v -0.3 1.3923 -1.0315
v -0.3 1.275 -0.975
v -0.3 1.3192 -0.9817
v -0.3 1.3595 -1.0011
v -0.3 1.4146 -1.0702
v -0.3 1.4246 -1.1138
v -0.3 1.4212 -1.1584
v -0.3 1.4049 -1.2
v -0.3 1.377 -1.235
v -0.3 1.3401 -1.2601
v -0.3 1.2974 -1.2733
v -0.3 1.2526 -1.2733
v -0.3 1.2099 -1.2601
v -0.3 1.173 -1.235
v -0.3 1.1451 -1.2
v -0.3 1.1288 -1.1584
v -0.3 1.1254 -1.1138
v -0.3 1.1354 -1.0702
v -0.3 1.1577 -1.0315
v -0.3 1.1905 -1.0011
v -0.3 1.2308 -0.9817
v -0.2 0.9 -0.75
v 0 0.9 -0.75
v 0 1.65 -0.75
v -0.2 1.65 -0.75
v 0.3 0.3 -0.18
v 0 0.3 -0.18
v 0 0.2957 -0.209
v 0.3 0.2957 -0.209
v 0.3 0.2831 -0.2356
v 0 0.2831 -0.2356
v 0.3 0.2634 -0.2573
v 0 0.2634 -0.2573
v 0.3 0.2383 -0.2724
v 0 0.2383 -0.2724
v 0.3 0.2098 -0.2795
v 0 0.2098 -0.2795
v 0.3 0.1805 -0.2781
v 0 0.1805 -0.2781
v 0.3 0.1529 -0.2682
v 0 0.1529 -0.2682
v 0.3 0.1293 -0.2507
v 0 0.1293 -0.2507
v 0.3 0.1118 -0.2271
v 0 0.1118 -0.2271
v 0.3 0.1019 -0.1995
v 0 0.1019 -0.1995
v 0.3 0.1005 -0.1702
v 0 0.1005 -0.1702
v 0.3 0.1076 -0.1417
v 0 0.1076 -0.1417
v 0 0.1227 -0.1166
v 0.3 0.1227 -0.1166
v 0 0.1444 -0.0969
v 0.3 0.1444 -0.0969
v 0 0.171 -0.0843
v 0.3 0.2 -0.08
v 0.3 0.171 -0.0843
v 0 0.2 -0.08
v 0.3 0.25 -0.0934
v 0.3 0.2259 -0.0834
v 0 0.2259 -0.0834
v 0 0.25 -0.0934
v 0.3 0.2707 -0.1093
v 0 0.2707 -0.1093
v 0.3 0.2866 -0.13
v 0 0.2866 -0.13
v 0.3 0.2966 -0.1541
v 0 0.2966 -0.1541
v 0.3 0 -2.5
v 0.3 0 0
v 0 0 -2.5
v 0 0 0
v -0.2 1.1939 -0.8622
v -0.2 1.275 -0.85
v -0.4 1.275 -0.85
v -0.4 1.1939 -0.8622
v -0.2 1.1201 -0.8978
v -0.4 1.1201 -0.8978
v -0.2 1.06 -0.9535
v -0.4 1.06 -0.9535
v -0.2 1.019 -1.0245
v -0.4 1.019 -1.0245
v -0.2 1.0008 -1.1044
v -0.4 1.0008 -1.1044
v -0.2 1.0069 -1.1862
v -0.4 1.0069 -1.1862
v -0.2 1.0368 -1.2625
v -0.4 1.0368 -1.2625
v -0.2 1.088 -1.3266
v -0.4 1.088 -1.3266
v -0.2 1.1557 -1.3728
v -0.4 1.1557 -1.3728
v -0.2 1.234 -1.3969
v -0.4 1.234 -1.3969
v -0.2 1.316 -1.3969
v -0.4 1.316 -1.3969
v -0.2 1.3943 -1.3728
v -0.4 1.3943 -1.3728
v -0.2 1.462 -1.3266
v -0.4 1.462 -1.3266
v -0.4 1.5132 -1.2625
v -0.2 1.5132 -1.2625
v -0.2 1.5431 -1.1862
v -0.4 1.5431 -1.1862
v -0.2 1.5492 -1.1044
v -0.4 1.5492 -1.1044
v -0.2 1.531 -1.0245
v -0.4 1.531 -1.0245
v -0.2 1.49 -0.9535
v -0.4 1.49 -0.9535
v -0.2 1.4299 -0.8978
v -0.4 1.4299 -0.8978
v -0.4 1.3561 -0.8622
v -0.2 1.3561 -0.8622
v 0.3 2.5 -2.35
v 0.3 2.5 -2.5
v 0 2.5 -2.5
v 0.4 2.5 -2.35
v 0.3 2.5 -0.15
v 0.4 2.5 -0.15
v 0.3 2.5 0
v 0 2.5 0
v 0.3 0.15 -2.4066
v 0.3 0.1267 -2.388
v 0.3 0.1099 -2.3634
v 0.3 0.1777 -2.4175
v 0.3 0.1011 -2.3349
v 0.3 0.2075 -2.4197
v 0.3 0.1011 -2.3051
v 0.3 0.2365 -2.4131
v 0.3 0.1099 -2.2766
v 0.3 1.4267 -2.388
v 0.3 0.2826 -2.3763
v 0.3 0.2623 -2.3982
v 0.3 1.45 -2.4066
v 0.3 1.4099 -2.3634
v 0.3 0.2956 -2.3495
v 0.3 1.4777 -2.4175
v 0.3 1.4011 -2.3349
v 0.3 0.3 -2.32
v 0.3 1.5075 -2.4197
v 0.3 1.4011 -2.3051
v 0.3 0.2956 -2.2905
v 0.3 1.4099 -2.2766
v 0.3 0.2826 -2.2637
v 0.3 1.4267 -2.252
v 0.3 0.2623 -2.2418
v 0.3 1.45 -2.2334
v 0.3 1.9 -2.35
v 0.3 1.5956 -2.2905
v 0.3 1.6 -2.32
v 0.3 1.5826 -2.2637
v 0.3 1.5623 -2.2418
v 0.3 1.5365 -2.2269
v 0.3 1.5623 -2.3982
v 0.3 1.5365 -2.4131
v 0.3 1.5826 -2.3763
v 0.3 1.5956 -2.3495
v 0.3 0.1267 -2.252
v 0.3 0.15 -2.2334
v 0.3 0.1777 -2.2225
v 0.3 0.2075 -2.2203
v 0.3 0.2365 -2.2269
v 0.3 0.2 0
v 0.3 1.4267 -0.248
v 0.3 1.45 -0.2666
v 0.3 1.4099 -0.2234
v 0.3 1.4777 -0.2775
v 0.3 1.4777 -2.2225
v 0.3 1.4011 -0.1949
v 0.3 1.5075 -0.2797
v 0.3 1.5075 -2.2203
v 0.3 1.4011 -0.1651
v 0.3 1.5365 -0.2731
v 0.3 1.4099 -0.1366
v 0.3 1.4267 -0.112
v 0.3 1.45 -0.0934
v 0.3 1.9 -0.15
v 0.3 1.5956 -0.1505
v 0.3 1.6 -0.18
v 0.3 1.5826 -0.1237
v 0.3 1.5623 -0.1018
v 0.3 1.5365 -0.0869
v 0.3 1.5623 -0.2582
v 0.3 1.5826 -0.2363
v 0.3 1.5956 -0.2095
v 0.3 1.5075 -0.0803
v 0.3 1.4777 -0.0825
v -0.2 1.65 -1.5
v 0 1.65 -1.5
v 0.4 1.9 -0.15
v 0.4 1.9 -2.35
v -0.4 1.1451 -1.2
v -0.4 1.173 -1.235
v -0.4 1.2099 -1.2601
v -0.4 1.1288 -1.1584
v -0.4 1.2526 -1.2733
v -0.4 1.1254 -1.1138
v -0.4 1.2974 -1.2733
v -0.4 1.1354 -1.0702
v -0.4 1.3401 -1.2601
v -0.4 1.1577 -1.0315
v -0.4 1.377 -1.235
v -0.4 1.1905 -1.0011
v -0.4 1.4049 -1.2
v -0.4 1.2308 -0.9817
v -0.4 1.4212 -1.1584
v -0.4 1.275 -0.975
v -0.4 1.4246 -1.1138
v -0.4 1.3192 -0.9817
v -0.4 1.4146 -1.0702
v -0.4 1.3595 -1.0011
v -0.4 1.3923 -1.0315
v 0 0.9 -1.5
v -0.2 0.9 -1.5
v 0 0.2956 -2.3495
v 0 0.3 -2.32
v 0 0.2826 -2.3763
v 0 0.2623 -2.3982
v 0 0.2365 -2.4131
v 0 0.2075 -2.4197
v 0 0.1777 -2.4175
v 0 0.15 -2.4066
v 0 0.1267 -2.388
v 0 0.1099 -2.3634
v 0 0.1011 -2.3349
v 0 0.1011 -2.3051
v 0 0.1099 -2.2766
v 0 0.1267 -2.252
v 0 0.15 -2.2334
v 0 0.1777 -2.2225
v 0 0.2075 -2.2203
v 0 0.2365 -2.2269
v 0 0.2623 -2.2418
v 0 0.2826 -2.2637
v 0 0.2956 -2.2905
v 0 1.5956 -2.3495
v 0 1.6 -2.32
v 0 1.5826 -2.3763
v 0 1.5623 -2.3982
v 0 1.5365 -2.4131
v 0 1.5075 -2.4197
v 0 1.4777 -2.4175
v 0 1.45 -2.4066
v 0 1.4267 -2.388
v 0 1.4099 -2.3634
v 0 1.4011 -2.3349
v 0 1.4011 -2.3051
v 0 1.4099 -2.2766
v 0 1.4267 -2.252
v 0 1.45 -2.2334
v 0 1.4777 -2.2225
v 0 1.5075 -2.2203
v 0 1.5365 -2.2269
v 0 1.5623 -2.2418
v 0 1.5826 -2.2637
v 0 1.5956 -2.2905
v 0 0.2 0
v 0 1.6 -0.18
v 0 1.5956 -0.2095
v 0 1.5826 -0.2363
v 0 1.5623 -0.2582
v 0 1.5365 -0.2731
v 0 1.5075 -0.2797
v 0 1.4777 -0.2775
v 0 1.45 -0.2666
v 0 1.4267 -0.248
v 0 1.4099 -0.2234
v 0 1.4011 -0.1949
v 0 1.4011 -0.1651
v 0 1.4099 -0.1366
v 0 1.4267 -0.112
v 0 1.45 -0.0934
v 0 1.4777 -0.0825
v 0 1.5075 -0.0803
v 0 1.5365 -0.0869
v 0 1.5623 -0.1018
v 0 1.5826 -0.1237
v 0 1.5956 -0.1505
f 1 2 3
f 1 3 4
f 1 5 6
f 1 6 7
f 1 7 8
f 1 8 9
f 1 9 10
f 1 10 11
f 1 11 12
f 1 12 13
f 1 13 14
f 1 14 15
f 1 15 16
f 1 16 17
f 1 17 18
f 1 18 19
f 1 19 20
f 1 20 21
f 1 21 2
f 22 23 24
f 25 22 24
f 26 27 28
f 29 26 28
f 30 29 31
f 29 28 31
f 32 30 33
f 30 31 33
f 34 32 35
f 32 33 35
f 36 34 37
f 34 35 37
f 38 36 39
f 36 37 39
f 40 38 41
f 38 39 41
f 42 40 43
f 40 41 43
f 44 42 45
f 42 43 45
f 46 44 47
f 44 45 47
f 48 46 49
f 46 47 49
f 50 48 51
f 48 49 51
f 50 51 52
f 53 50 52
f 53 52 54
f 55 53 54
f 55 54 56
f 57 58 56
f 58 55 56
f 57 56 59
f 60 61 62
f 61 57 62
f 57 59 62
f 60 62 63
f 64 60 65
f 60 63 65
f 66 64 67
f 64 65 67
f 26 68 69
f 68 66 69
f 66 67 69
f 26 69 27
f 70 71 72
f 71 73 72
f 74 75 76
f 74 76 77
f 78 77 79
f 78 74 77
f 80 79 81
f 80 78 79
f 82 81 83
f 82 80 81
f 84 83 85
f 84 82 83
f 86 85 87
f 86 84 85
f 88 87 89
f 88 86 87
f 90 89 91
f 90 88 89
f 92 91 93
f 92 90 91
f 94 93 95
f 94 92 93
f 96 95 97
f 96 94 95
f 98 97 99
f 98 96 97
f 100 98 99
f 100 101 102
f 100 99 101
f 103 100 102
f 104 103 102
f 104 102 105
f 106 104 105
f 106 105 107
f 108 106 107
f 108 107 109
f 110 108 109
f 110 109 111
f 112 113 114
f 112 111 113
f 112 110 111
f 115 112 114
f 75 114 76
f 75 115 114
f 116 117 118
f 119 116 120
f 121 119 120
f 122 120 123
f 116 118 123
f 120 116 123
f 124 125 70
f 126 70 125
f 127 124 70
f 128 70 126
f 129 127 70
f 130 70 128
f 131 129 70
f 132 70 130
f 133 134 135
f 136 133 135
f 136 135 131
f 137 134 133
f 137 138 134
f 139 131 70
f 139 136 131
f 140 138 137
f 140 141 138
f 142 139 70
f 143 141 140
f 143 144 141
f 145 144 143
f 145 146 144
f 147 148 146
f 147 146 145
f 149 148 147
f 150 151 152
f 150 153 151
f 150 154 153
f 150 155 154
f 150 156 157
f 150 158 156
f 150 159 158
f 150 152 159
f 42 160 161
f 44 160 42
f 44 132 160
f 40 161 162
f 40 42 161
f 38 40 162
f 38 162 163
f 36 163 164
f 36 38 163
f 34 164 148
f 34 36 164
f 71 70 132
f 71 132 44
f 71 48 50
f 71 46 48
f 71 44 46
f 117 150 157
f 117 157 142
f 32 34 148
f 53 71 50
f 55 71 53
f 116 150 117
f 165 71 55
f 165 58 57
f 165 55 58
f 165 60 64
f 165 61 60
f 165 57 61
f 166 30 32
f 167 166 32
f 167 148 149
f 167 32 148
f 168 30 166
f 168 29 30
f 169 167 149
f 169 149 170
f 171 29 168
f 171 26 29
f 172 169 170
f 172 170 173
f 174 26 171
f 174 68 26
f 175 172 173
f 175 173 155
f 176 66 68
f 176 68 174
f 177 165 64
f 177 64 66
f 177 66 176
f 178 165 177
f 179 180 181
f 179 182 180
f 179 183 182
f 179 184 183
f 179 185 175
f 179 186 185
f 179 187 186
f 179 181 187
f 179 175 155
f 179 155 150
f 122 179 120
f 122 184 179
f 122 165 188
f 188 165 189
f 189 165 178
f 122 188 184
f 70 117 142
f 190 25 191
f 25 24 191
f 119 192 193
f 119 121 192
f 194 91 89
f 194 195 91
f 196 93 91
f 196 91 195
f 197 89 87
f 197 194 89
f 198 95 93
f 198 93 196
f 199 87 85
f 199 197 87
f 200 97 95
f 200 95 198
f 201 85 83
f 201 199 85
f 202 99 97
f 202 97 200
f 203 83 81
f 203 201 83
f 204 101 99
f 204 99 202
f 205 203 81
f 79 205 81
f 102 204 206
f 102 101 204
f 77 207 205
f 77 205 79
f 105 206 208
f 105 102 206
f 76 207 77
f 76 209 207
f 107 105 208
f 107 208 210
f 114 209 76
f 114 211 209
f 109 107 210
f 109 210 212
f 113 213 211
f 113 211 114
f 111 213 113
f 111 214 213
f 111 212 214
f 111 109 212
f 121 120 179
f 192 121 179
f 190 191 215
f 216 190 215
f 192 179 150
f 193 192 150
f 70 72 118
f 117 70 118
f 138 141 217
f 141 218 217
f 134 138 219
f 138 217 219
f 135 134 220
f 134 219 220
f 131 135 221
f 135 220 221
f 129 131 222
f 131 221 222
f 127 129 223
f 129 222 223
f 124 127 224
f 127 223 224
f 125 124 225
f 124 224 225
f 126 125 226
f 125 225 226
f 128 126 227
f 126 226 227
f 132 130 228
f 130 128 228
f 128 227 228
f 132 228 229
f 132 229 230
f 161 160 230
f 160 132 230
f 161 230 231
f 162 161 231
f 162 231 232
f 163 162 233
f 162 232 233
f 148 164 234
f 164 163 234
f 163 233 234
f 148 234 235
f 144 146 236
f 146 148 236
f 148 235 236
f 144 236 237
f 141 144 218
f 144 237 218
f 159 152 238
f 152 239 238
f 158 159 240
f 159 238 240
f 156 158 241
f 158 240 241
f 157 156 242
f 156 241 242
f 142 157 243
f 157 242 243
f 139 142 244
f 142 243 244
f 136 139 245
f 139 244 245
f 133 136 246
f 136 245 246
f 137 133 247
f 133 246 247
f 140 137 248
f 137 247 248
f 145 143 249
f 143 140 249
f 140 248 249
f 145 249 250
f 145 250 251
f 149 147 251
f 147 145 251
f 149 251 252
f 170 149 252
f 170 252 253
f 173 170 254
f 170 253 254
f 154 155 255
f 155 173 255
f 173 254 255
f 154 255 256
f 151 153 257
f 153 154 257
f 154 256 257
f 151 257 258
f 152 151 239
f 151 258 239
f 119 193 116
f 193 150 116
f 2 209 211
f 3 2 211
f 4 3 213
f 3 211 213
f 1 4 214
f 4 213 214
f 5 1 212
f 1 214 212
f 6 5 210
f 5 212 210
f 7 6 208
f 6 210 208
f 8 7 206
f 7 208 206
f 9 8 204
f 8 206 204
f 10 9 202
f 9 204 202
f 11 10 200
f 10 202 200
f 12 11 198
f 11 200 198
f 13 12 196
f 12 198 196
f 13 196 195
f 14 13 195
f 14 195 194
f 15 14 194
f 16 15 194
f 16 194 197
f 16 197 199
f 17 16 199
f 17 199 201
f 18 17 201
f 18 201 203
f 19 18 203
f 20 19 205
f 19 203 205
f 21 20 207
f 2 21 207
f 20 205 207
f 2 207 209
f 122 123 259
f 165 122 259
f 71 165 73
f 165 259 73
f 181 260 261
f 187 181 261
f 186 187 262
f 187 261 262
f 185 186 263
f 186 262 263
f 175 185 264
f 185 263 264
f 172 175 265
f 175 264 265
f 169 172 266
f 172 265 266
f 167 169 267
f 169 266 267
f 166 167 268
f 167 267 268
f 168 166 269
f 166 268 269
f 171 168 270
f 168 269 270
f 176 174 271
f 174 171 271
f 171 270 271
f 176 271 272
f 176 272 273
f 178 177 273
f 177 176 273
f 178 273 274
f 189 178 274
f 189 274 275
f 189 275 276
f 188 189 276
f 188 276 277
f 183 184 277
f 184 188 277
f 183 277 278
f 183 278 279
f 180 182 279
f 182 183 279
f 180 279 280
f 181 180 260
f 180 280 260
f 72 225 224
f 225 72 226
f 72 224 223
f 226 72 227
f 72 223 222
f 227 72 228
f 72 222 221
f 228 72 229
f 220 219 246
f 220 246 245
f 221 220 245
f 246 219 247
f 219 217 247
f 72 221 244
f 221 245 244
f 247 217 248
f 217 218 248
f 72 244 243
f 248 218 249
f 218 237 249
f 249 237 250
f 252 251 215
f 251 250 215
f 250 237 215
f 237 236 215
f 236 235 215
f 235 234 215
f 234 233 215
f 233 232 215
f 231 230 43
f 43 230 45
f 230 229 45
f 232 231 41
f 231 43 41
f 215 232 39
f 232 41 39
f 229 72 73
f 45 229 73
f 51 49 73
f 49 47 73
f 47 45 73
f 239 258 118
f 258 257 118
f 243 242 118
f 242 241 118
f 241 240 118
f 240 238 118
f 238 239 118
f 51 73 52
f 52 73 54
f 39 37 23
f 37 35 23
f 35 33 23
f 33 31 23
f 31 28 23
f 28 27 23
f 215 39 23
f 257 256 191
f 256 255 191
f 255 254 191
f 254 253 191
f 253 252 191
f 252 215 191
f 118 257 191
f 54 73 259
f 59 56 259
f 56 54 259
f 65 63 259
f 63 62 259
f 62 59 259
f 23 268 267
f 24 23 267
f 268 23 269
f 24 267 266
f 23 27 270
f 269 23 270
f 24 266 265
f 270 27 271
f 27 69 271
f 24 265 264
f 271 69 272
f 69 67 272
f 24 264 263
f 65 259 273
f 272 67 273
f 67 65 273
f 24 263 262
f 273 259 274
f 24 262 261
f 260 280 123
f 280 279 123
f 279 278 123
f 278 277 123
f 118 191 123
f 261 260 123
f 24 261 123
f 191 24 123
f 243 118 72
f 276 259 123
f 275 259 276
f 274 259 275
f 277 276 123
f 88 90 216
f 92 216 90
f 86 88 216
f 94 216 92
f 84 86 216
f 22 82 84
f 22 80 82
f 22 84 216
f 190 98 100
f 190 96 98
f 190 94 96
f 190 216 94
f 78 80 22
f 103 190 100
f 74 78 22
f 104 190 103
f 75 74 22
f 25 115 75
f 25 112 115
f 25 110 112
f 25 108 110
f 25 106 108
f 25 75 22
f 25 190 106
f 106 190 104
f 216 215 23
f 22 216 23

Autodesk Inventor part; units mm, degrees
ref_plane "YZ Plane" through (0, 0, 0) normal (1, 0, 0) x (0, 1, 0)
ref_plane "XZ Plane" through (0, 0, 0) normal (0, 1, 0) x (-1, 0, 0)
ref_plane "XY Plane" through (0, 0, 0) normal (0, 0, 1) x (1, 0, 0)
sketch "Boceto1" plane through (0, 0, 0) normal (1, 0, 0) x (0, 1, 0)
  line L0 (0, 0) -> (0, -2.5)
  line L1 (0, -2.5) -> (2.5, -2.5)
  line L2 (2.5, -2.5) -> (2.5, 0)
  line L3 (2.5, 0) -> (0, 0)
  line L4 (0, 0) -> (0.2, 0)
  line L5 (0.2, 0) -> (0.2, -0.18)
  circle A0 centre (0.2, -0.18) radius 0.1
  line L6 (0, 0) -> (1.5, 0)
  circle A1 centre (1.5, -0.18) radius 0.1
  circle A2 centre (0.2, -2.32) radius 0.1
  circle A3 centre (1.5, -2.32) radius 0.1
  line L7 (2.5, -0.35) -> (1.9, -0.35)
  line L8 (1.9, -0.35) -> (1.9, -2.35)
  line L9 (1.9, -2.35) -> (2.5, -2.35)
  dimension "d0" = 2.5
  dimension "d1" = 2.5
  dimension "d2" = 0.2
  dimension "d3" = 0.18
  dimension "d4" = 0.2
  dimension "d5" = 1.5
  dimension "d6" = 0.2
  dimension "d8" = 0.6
  dimension "d48" = 0.18
  dimension "d49" = 0.18
extrude "Extrusión1" add sketch "Boceto1" along normal blind 0.3
sketch "Boceto2" plane through (0.3, 0, 0) normal (1, 0, 0) x (0, 0, -1)
  line L0 (0, 0) -> (2.3, 0)
  line L1 (2.3, 2.5) -> (0, 2.5)
  line L2 (0, 2.5) -> (0, 0)
  line L3 (0, 0) -> (0, 0.2)
  line L4 (0, 0.2) -> (0.18, 0.2)
  circle A0 centre (0.18, 0.2) radius 0.1
  line L5 (0, 0) -> (0, 1.5)
  circle A1 centre (0.18, 1.5) radius 0.1
  circle A2 centre (2.12, 0.2) radius 0.1
  circle A3 centre (2.12, 1.5) radius 0.1
  line L6 (0.15, 2.5) -> (0.15, 1.9)
  line L7 (0.15, 1.9) -> (2.15, 1.9)
  line L8 (0, 0) -> (2.5, 0)
  line L9 (2.5, 0) -> (2.5, 2.5)
  line L10 (2.5, 2.5) -> (0, 2.5)
  line L11 (0, 2.5) -> (0, 0)
  line L12 (0, 0) -> (0, 0.2)
  line L13 (0, 0.2) -> (0.18, 0.2)
  circle A4 centre (0.18, 0.2) radius 0.1
  line L14 (0, 0) -> (0, 1.5)
  circle A5 centre (0.18, 1.5) radius 0.1
  circle A6 centre (2.12, 0.2) radius 0.1
  circle A7 centre (2.12, 1.5) radius 0.1
  line L15 (0.35, 1.9) -> (2.35, 1.9)
  line L16 (2.35, 1.9) -> (2.35, 2.5)
  line L17 (2.35, 1.9) -> (0.15, 1.9)
  line L18 (0.15, 1.9) -> (0.15, 2.5)
  line L19 (0.15, 2.5) -> (2.35, 2.5)
  line L20 (2.35, 2.5) -> (2.35, 1.9)
  point P0 (2.15, 2.5)
  dimension "d13" = 2.5
  dimension "d14" = 0.2
  dimension "d15" = 0.18
  dimension "d16" = 0.2
  dimension "d17" = 1.5
  dimension "d18" = 0.2
  dimension "d19" = 0.6
  dimension "d20" = 2.5
  dimension "d21" = 2.5
  dimension "d22" = 0.2
  dimension "d23" = 0.18
  dimension "d24" = 0.2
  dimension "d25" = 1.5
  dimension "d26" = 0.2
extrude "Extrusión2" add sketch "Boceto2" along normal blind 0.1 contours L16 L15 L7 L6 L1 L10
sketch "Boceto3" plane through (0, 0, 0) normal (-1, 0, 0) x (0, 0, 1)
  line L0 (0, 0) -> (-2.5, 0) projected
  line L1 (-2.5, 0) -> (-1.5, 0)
  line L2 (-1.5, 0) -> (-1.5, 0.9)
  line L3 (-1.5, 0.9) -> (-0.75, 0.9)
  line L4 (-0.75, 0.9) -> (-0.75, 1.65)
  line L5 (-0.75, 1.65) -> (-1.5, 1.65)
  line L6 (-1.5, 1.65) -> (-1.5, 0.9)
  circle A0 centre (-1.125, 1.275) radius 0.275
  dimension "d30" = 1
  dimension "d31" = 0.9
  dimension "d32" = 0.75
  dimension "d33" = 0.75
  dimension "d34" = 0.75
  dimension "d35" = 0.55
extrude "Extrusión3" add sketch "Boceto3" along normal blind 0.2 contours L6 L5 L4 L3 | A0
sketch "Boceto4" plane through (-0.2, 0, 0) normal (-1, 0, 0) x (0, 0, 1)
  line L0 (-1.5, 0) -> (-1.5, 0.9)
  line L1 (-1.5, 0.9) -> (-0.75, 0.9)
  line L2 (-0.75, 0.9) -> (-0.75, 1.65)
  line L3 (-0.75, 1.65) -> (-1.5, 1.65)
  line L4 (-1.5, 1.65) -> (-1.5, 0.9)
  circle A0 centre (-1.125, 1.275) radius 0.275
  point P0 (0, 0)
  dimension "d38" = 0.9
  dimension "d39" = 0.75
  dimension "d40" = 0.75
  dimension "d41" = 0.75
  dimension "d42" = 0.55
extrude "Extrusión4" add sketch "Boceto4" along normal blind 0.2 contours A0
sketch "Boceto5" plane through (-0.4, 1.275, -1.125) normal (-1, 0, 0) x (0, 0, 1)
  circle A0 centre (0, 0) radius 0.275 projected
  circle A1 centre (0, 0) radius 0.15
  point P0 (1.125, -1.275)
  dimension "d45" = 0.125
extrude "Extrusión5" cut sketch "Boceto5" against normal blind 0.1 contours A1
properties part number "camera"
